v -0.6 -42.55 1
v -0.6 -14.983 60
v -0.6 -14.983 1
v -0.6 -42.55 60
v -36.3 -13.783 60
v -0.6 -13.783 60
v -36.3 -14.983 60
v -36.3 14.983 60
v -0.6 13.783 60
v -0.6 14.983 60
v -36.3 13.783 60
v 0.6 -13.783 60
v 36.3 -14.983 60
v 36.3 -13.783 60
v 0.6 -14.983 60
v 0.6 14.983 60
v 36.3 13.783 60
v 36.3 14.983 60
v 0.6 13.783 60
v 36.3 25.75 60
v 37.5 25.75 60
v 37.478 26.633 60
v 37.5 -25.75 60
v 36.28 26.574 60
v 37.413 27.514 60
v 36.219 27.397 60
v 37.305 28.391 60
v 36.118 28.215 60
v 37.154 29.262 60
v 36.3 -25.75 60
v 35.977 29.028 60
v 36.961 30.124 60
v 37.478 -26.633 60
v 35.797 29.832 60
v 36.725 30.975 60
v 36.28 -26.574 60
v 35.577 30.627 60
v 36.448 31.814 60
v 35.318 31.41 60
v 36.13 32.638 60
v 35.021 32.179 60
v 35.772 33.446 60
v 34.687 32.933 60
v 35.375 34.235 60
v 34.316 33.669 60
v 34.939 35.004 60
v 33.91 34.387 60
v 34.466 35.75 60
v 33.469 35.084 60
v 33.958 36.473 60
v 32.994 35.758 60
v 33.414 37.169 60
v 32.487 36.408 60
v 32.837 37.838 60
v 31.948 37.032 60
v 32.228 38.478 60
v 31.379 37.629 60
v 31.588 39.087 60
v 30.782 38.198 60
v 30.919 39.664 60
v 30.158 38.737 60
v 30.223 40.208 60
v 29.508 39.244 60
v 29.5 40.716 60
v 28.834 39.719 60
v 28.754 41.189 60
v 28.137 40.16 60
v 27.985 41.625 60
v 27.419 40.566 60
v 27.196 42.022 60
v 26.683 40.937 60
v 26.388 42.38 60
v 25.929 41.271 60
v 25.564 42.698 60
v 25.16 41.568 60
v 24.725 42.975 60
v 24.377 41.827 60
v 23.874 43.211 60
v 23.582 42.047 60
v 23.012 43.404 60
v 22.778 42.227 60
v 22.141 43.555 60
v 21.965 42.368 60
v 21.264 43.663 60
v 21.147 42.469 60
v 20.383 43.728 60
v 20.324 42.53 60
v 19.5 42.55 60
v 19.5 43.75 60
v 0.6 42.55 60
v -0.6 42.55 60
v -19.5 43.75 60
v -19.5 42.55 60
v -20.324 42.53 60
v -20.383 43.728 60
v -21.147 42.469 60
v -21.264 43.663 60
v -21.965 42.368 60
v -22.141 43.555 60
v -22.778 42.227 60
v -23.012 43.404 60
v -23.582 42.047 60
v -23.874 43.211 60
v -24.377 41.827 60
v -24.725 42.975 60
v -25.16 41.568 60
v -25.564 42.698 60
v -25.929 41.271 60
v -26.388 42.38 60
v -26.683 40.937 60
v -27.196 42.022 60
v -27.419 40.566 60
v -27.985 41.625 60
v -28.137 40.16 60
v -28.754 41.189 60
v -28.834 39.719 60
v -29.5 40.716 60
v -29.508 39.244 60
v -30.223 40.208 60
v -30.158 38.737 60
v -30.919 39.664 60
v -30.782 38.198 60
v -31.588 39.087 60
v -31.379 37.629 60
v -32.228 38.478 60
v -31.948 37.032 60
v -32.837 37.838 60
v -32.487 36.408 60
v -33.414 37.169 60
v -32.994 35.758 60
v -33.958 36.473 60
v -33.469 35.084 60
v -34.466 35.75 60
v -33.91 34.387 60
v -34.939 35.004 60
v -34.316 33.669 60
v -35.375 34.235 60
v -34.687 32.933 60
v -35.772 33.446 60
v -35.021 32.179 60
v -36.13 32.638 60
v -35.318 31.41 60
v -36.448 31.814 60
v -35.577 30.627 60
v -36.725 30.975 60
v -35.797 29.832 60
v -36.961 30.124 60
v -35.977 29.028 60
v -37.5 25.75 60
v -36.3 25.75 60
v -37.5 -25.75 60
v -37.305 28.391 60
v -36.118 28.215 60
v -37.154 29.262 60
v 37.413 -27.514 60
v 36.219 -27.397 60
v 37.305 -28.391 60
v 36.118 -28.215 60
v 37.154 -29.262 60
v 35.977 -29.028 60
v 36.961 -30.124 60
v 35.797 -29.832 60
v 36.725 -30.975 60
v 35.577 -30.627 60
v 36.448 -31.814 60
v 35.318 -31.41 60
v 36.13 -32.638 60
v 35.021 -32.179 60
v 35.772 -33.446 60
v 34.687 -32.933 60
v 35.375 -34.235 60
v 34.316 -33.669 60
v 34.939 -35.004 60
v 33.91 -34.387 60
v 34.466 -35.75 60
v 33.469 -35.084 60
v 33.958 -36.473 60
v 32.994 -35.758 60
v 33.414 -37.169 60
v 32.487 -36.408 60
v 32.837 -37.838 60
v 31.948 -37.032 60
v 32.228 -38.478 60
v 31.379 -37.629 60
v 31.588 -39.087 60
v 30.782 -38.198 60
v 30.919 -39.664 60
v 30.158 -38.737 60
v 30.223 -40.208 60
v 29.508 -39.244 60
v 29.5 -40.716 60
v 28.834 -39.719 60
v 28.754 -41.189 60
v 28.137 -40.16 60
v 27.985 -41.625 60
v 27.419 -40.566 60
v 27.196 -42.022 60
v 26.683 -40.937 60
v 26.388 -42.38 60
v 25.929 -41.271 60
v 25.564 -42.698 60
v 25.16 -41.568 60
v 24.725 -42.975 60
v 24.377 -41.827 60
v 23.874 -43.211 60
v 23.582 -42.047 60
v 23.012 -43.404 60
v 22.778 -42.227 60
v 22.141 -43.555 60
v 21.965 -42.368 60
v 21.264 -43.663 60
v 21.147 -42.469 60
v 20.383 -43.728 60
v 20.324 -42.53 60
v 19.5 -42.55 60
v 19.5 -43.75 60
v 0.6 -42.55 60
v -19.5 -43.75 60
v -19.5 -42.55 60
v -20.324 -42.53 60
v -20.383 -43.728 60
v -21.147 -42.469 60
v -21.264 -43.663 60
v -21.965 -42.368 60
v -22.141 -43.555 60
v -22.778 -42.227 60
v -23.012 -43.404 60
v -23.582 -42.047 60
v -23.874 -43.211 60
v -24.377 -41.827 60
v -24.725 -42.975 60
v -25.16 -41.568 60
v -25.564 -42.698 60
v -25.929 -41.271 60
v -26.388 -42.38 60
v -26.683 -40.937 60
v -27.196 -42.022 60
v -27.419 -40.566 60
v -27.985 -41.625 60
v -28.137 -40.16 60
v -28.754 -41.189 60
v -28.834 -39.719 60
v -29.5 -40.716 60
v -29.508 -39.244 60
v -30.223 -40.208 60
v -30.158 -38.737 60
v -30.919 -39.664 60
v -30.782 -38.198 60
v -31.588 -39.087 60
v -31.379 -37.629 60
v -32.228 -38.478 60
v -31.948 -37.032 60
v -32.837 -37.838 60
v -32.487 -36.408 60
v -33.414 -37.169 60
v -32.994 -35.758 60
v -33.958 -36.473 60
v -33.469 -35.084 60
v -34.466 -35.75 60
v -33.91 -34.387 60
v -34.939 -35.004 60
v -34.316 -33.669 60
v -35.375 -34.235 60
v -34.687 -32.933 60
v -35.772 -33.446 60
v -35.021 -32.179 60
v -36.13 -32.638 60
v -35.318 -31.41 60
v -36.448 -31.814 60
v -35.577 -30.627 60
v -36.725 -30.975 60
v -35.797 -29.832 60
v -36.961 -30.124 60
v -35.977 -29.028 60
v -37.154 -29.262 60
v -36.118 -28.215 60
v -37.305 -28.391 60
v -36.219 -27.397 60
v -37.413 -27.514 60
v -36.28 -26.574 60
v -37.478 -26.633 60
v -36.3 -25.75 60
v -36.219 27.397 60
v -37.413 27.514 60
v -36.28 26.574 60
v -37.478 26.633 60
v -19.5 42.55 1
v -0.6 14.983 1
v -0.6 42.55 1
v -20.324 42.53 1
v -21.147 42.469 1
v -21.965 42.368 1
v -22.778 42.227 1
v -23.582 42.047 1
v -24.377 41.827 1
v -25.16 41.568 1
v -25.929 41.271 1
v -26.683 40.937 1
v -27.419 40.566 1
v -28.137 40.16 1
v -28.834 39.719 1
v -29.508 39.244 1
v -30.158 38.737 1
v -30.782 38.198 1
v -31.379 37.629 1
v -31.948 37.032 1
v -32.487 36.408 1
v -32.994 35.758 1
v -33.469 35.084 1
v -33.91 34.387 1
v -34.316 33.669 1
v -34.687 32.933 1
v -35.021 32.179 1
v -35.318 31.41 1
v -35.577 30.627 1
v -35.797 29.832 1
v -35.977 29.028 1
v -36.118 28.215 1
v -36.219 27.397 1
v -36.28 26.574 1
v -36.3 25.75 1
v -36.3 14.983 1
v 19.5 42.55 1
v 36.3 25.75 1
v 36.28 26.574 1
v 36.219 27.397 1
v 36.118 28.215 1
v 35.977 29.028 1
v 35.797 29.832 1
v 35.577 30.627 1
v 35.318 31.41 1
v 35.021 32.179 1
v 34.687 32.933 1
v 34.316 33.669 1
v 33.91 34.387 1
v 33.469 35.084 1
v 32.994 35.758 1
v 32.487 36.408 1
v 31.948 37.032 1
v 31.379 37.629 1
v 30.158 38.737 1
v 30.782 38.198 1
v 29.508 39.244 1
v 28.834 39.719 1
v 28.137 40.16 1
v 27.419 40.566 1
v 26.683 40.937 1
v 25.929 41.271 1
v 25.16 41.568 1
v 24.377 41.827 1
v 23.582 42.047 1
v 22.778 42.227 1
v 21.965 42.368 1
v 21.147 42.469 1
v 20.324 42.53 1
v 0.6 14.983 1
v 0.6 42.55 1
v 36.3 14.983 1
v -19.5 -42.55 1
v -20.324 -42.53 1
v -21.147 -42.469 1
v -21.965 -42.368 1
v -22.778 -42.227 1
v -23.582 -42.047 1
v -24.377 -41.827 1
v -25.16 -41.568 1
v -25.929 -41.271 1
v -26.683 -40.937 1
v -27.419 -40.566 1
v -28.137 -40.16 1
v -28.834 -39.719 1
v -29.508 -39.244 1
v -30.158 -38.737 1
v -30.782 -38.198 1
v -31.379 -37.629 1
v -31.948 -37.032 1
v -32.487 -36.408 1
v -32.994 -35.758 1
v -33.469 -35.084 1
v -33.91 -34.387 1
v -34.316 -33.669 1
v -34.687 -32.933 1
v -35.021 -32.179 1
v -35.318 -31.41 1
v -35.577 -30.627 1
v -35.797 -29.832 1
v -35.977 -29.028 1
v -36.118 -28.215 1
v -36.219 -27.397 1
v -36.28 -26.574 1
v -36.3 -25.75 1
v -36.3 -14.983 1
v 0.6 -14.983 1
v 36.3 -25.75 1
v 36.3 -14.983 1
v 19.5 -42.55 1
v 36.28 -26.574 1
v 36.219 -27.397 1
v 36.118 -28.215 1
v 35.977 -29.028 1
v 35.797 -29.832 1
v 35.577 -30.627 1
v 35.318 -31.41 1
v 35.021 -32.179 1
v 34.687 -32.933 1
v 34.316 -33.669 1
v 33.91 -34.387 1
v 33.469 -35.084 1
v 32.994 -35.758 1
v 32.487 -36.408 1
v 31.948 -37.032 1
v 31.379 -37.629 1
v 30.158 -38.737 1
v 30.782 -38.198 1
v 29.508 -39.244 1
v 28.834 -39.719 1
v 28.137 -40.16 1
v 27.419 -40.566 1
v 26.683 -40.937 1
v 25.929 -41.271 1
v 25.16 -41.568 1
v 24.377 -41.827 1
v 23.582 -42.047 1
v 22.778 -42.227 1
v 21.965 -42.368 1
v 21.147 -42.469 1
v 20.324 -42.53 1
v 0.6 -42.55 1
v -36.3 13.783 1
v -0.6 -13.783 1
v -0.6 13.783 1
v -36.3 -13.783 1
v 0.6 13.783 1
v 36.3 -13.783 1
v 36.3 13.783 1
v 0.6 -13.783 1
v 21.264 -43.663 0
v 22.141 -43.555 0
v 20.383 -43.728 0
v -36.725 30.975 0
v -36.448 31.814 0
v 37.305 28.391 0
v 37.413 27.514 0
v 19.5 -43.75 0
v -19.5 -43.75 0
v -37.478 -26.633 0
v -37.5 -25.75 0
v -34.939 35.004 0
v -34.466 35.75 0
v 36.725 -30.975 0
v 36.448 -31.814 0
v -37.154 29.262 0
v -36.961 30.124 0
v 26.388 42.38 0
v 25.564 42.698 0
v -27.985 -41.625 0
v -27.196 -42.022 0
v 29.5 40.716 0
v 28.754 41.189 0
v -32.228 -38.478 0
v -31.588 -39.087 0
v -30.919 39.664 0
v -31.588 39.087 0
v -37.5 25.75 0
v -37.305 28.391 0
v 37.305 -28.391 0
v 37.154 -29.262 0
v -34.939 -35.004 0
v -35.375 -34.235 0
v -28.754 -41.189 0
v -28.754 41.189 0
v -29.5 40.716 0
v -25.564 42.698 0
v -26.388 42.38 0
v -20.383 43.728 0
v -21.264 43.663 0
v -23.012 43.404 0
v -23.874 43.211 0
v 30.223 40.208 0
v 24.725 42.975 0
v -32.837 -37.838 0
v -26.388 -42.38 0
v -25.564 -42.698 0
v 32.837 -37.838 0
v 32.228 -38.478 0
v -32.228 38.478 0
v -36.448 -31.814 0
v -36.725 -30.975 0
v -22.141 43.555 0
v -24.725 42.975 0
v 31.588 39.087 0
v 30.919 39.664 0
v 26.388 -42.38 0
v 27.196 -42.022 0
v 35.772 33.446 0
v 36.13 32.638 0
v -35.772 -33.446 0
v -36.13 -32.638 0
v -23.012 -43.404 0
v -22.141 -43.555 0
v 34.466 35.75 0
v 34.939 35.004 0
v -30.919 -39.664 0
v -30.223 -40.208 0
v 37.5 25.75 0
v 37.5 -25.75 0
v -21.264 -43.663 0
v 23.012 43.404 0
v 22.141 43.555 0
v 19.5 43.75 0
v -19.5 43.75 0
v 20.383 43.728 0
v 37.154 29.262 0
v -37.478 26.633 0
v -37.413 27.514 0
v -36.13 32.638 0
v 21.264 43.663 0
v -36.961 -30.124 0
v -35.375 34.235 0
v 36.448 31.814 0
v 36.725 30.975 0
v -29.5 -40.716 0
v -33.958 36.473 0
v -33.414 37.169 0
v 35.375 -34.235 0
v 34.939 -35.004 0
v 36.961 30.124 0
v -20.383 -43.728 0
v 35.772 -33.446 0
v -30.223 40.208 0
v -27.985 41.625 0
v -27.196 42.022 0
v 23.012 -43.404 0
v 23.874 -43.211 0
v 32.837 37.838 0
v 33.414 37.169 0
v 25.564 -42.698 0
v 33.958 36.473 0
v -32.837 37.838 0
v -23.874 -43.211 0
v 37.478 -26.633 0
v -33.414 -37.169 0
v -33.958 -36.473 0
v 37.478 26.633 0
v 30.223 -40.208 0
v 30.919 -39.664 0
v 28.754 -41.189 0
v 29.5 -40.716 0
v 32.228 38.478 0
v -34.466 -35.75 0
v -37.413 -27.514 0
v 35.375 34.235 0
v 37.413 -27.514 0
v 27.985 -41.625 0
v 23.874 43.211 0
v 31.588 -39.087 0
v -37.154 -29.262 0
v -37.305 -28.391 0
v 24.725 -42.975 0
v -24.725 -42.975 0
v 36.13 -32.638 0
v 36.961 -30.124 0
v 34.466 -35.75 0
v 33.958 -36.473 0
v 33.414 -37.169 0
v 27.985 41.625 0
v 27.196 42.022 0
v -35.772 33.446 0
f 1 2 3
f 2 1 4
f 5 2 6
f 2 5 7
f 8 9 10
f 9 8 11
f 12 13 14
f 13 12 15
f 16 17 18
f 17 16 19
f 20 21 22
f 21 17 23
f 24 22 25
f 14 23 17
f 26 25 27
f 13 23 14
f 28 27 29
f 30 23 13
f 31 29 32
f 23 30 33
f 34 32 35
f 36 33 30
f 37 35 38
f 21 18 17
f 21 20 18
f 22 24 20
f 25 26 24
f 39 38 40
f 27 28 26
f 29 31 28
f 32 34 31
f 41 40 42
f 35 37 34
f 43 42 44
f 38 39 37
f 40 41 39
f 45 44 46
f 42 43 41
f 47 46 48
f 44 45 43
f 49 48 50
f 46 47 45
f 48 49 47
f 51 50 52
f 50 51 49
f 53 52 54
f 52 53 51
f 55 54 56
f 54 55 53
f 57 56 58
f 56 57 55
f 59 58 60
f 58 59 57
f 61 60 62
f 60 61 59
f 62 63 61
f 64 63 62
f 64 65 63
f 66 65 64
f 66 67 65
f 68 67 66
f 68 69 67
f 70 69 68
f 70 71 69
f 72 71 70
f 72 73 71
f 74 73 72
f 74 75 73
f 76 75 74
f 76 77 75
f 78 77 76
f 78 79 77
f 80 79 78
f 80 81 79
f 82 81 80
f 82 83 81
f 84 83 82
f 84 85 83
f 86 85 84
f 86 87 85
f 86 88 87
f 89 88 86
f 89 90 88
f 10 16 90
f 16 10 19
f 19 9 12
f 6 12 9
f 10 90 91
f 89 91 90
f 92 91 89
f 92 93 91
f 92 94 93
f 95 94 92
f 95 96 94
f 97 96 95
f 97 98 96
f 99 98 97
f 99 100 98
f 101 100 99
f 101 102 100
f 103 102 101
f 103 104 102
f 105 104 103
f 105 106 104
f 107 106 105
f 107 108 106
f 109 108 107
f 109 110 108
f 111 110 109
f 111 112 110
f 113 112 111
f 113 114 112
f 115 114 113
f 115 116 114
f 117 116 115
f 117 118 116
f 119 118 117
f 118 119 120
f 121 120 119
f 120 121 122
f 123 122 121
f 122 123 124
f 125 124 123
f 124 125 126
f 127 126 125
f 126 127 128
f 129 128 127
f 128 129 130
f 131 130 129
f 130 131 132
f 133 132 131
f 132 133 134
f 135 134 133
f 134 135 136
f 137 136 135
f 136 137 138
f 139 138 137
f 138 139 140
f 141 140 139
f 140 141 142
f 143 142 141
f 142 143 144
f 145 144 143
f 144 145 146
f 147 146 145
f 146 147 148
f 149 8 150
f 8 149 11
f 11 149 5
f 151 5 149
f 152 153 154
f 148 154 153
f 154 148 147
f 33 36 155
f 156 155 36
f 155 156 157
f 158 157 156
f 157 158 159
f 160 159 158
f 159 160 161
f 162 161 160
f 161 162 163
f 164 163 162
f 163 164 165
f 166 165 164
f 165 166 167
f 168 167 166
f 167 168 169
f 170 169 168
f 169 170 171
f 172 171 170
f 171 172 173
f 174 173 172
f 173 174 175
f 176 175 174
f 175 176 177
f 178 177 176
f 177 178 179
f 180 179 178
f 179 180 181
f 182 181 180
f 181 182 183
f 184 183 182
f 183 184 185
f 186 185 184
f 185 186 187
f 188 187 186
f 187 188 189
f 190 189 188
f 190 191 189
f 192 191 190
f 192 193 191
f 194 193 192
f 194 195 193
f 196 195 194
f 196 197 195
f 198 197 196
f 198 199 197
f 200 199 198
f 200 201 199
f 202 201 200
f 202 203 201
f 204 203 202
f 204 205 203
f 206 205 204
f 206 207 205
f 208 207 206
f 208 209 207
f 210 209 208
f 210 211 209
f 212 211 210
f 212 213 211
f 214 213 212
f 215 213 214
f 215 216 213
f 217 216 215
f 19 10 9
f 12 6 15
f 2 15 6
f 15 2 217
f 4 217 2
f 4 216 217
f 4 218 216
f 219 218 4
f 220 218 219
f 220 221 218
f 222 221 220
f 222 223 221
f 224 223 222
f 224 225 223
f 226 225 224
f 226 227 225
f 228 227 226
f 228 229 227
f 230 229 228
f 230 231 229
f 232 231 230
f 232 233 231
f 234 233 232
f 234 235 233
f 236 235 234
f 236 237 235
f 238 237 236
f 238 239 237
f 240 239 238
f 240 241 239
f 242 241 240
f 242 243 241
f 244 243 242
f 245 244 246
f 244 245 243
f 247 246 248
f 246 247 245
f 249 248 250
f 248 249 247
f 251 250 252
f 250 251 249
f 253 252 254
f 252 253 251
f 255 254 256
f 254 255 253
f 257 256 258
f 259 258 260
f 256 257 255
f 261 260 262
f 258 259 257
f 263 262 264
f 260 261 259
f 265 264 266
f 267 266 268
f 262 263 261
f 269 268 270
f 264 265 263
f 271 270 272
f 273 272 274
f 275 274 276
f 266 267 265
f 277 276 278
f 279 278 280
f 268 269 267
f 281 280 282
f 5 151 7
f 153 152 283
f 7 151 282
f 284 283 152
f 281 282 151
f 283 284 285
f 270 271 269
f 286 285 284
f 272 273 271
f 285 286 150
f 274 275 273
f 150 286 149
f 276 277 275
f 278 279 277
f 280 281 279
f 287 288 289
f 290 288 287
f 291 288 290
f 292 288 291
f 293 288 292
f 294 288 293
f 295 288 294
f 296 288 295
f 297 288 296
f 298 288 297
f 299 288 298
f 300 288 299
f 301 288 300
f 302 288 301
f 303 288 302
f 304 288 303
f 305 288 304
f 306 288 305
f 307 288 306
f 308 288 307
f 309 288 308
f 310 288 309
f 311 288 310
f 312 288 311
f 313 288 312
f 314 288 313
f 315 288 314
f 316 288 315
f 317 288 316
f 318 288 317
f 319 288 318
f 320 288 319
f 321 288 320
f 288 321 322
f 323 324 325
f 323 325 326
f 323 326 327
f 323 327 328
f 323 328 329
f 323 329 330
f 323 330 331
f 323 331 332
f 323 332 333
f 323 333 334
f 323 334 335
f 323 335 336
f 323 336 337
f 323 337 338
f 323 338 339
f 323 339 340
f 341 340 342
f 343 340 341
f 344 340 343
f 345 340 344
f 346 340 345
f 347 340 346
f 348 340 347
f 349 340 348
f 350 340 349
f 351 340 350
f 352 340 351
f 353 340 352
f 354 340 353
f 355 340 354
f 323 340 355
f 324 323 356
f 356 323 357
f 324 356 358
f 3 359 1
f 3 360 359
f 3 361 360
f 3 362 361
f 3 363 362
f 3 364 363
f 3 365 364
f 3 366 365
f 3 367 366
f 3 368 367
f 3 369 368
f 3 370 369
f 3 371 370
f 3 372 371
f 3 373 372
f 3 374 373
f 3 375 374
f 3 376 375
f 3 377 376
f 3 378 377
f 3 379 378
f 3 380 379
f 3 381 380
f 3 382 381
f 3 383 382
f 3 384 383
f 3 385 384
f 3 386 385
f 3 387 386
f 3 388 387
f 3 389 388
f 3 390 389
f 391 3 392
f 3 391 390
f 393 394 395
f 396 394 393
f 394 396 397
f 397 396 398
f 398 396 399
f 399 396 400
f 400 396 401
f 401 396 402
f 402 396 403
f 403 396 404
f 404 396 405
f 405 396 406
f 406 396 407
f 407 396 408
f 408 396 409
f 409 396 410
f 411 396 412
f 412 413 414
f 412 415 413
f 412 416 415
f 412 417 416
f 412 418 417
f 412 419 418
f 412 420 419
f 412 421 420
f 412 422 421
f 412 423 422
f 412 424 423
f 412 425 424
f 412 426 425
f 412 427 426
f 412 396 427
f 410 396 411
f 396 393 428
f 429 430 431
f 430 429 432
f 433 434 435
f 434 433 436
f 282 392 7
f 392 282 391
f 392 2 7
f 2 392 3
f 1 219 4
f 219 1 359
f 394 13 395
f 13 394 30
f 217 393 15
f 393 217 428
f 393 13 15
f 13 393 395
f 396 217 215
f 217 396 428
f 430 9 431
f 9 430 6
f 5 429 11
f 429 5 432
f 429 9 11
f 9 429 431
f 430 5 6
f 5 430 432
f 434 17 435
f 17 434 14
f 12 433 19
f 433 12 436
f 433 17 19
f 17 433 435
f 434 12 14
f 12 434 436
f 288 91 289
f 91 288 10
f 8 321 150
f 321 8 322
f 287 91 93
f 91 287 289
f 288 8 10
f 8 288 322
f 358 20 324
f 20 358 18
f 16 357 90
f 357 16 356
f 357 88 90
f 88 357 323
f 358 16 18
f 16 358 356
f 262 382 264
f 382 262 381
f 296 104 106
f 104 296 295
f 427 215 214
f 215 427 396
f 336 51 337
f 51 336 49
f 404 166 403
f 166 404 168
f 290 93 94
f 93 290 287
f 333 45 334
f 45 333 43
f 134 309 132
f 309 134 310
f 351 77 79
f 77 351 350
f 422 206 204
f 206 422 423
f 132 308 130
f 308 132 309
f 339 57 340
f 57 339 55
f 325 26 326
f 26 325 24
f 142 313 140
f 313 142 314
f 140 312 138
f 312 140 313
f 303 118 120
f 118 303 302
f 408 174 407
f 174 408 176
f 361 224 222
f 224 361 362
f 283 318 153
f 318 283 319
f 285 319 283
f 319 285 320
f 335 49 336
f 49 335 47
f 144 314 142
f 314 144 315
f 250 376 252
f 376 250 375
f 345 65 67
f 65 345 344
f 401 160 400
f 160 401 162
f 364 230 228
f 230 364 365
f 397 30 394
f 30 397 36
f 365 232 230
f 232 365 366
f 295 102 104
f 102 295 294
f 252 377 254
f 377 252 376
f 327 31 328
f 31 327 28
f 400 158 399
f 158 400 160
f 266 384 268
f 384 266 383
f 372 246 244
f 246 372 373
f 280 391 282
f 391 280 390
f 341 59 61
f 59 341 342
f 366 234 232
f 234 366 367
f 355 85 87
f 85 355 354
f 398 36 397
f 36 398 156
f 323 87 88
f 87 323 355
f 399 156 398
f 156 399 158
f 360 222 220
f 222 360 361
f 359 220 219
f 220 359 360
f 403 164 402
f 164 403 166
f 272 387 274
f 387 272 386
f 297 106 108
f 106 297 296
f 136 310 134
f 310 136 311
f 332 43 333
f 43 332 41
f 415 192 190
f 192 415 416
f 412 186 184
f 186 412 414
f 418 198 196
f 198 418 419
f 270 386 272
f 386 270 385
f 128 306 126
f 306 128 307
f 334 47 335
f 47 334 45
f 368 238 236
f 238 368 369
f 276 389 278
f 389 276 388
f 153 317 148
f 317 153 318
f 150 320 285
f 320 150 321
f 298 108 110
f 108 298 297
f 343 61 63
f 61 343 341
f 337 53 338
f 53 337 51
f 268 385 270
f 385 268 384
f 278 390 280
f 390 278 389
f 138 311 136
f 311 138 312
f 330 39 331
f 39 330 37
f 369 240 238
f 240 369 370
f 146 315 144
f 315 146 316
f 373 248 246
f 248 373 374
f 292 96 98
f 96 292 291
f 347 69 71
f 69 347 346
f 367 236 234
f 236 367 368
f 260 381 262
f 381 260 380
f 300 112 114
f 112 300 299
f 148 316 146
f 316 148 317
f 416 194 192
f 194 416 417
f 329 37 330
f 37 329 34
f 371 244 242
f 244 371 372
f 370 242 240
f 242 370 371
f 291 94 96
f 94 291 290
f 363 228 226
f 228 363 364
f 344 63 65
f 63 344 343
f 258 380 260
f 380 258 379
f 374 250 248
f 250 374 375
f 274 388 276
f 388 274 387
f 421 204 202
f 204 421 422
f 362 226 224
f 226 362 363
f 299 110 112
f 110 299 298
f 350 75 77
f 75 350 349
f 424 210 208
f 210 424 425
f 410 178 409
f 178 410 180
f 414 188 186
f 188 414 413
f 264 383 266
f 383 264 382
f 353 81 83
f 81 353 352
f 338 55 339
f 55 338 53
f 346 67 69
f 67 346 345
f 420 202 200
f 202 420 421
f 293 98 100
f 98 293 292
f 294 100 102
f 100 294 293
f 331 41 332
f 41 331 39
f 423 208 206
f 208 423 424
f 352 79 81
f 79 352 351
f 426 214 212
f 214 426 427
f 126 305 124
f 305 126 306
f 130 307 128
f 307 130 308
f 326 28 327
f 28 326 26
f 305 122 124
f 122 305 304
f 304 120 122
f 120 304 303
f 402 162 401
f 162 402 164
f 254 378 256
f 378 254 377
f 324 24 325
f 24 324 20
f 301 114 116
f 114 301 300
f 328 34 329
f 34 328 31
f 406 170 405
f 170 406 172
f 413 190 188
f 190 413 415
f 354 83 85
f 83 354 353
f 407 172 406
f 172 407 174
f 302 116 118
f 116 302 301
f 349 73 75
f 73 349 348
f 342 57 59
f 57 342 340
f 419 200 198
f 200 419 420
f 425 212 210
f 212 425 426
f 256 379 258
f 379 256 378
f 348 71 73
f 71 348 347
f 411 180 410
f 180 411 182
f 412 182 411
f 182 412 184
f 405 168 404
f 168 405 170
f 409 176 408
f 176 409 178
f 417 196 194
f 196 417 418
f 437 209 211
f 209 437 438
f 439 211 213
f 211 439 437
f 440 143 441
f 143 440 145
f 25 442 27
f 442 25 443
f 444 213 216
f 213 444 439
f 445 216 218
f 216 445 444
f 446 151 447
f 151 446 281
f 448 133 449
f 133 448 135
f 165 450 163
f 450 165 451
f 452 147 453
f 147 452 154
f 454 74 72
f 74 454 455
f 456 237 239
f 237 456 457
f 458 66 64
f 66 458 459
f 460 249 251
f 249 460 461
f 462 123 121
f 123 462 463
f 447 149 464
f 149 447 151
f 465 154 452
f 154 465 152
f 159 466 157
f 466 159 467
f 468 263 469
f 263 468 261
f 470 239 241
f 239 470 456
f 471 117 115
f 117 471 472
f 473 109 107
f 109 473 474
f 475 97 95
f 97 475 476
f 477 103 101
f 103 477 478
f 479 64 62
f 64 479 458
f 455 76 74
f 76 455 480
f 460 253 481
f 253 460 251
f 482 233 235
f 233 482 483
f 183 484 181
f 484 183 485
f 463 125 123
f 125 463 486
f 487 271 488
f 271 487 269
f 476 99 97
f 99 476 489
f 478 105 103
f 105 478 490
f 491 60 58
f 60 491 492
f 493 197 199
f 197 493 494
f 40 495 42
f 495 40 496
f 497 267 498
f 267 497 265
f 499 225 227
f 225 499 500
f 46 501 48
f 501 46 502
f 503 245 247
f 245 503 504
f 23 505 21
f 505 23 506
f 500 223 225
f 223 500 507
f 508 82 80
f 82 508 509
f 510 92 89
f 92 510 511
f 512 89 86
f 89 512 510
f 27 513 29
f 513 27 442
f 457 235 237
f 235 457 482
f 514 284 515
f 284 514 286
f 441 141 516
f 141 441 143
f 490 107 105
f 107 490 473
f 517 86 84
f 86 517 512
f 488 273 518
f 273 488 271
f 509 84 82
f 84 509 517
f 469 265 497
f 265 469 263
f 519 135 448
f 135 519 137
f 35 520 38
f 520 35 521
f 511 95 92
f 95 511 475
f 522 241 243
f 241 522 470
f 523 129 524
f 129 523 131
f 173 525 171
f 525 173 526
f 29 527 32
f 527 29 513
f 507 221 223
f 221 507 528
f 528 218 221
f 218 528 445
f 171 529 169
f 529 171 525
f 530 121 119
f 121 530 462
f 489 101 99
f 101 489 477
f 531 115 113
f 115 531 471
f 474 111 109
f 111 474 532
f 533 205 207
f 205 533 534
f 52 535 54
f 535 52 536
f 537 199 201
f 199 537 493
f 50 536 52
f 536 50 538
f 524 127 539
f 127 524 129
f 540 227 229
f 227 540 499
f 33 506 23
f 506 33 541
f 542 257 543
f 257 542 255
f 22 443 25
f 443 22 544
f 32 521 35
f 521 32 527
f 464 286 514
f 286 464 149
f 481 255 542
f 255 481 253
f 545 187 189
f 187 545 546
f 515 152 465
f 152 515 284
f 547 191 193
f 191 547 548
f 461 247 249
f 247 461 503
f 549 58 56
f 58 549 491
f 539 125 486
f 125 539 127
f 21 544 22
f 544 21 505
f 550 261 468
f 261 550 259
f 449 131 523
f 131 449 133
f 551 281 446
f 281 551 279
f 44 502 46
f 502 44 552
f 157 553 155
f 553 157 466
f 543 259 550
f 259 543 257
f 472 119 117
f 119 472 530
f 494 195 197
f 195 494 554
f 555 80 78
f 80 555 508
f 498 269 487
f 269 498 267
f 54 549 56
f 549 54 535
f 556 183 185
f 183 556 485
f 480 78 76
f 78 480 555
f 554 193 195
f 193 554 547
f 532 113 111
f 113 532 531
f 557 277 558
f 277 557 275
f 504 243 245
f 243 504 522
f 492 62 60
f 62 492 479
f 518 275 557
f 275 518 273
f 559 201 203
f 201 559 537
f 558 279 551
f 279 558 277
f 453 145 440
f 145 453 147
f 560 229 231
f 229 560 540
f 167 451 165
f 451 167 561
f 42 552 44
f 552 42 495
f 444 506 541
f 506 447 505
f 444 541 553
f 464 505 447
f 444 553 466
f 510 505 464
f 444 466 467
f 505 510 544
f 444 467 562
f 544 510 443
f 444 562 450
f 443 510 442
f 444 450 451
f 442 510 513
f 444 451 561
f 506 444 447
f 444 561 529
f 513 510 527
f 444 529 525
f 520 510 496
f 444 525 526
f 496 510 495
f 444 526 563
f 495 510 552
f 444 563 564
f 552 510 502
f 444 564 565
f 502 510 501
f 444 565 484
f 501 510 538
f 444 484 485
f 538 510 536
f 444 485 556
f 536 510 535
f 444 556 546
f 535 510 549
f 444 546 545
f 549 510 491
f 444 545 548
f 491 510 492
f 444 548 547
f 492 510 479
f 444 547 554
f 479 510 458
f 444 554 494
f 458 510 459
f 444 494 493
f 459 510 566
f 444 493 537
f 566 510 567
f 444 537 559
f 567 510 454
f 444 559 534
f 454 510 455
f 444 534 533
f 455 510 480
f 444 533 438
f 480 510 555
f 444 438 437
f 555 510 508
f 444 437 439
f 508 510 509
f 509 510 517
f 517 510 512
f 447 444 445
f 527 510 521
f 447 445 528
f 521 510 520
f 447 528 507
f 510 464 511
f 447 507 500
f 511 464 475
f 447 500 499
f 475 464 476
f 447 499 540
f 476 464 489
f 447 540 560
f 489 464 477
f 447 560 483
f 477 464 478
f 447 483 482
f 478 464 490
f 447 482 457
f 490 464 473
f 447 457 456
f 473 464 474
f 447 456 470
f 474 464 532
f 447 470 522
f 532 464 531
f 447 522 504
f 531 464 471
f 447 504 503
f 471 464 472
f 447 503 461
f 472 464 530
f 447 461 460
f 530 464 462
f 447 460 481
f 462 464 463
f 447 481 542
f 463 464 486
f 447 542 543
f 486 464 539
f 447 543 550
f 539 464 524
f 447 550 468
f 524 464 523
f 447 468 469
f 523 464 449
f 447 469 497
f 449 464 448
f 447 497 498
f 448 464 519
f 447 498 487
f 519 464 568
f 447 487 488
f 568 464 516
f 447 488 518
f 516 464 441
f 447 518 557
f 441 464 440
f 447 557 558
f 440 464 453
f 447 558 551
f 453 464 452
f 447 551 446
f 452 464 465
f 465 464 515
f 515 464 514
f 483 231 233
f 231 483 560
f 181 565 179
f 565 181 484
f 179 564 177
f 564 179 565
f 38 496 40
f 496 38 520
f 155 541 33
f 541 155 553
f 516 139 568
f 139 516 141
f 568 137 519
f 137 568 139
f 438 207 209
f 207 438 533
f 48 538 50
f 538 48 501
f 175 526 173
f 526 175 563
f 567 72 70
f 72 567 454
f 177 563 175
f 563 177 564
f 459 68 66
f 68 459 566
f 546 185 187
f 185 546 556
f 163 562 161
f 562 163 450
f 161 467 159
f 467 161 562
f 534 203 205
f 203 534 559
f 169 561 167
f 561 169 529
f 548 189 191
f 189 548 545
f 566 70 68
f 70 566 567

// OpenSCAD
/* [Rows, columns and height] */

// The number of rows (the "widest" direction of the container, "front" to "back" when looking at the board).
rows = 3;
// The number of columns (the "smallest" direction of the container, "left" to "right" when looking at the board).
columns = 2;
// The height of the model, in mm.
height = 60;

/* [Tweaks, in case the model doesn't fit] */

// The outer width of the insert (the dimension from "left" to "right" when looking at the board), in mm.
outer_width = 75;

// The outer depth of the insert (the distance between the "front" to "back" when looking at the board), in mm.
outer_depth = 87.5;

// The outer radii of the corners, in mm.
outer_radius = 18;

// Wall thickness, in mm. 1.2mm should work for 0.2, 0.4 and 0.6mm nozzles
wall_thickness = 1.2;

// Bottom thickness, in mm.
bottom_thickness = 1;

/* [Hidden] */

// Bump arc resolution, so every corner gets 32 segments.
$fn = 128;


translate([-outer_width / 2, -outer_depth / 2])
difference() {
	rounded_cube(outer_width, outer_depth, height, outer_radius);
	segments();
}
;

module segments() {
	$segment_width = (outer_width - (wall_thickness * (columns + 1))) / columns;
	$segment_depth = (outer_depth - (wall_thickness * (rows + 1))) / rows;

	intersection() {
		union() {
			for (y = [0:(rows-1)])
				for (x = [0:(columns - 1)])
					translate([
						wall_thickness * (1 + x) + $segment_width * x,
						wall_thickness * (1 + y) + $segment_depth * y,
						bottom_thickness
					])
					cube([
						$segment_width,
						$segment_depth,
						height - bottom_thickness
					])
					;
		}

		translate([wall_thickness, wall_thickness, bottom_thickness])
		rounded_cube(
			outer_width - wall_thickness * 2,
			outer_depth - wall_thickness * 2,
			height - bottom_thickness,
			outer_radius - wall_thickness
		)
		;
	}
}

module rounded_cube(width, depth, height, r) {
	translate([r, r])
	linear_extrude(height)
	offset(r = r)
	square([width - r * 2, depth - r * 2], false)
	;
}
